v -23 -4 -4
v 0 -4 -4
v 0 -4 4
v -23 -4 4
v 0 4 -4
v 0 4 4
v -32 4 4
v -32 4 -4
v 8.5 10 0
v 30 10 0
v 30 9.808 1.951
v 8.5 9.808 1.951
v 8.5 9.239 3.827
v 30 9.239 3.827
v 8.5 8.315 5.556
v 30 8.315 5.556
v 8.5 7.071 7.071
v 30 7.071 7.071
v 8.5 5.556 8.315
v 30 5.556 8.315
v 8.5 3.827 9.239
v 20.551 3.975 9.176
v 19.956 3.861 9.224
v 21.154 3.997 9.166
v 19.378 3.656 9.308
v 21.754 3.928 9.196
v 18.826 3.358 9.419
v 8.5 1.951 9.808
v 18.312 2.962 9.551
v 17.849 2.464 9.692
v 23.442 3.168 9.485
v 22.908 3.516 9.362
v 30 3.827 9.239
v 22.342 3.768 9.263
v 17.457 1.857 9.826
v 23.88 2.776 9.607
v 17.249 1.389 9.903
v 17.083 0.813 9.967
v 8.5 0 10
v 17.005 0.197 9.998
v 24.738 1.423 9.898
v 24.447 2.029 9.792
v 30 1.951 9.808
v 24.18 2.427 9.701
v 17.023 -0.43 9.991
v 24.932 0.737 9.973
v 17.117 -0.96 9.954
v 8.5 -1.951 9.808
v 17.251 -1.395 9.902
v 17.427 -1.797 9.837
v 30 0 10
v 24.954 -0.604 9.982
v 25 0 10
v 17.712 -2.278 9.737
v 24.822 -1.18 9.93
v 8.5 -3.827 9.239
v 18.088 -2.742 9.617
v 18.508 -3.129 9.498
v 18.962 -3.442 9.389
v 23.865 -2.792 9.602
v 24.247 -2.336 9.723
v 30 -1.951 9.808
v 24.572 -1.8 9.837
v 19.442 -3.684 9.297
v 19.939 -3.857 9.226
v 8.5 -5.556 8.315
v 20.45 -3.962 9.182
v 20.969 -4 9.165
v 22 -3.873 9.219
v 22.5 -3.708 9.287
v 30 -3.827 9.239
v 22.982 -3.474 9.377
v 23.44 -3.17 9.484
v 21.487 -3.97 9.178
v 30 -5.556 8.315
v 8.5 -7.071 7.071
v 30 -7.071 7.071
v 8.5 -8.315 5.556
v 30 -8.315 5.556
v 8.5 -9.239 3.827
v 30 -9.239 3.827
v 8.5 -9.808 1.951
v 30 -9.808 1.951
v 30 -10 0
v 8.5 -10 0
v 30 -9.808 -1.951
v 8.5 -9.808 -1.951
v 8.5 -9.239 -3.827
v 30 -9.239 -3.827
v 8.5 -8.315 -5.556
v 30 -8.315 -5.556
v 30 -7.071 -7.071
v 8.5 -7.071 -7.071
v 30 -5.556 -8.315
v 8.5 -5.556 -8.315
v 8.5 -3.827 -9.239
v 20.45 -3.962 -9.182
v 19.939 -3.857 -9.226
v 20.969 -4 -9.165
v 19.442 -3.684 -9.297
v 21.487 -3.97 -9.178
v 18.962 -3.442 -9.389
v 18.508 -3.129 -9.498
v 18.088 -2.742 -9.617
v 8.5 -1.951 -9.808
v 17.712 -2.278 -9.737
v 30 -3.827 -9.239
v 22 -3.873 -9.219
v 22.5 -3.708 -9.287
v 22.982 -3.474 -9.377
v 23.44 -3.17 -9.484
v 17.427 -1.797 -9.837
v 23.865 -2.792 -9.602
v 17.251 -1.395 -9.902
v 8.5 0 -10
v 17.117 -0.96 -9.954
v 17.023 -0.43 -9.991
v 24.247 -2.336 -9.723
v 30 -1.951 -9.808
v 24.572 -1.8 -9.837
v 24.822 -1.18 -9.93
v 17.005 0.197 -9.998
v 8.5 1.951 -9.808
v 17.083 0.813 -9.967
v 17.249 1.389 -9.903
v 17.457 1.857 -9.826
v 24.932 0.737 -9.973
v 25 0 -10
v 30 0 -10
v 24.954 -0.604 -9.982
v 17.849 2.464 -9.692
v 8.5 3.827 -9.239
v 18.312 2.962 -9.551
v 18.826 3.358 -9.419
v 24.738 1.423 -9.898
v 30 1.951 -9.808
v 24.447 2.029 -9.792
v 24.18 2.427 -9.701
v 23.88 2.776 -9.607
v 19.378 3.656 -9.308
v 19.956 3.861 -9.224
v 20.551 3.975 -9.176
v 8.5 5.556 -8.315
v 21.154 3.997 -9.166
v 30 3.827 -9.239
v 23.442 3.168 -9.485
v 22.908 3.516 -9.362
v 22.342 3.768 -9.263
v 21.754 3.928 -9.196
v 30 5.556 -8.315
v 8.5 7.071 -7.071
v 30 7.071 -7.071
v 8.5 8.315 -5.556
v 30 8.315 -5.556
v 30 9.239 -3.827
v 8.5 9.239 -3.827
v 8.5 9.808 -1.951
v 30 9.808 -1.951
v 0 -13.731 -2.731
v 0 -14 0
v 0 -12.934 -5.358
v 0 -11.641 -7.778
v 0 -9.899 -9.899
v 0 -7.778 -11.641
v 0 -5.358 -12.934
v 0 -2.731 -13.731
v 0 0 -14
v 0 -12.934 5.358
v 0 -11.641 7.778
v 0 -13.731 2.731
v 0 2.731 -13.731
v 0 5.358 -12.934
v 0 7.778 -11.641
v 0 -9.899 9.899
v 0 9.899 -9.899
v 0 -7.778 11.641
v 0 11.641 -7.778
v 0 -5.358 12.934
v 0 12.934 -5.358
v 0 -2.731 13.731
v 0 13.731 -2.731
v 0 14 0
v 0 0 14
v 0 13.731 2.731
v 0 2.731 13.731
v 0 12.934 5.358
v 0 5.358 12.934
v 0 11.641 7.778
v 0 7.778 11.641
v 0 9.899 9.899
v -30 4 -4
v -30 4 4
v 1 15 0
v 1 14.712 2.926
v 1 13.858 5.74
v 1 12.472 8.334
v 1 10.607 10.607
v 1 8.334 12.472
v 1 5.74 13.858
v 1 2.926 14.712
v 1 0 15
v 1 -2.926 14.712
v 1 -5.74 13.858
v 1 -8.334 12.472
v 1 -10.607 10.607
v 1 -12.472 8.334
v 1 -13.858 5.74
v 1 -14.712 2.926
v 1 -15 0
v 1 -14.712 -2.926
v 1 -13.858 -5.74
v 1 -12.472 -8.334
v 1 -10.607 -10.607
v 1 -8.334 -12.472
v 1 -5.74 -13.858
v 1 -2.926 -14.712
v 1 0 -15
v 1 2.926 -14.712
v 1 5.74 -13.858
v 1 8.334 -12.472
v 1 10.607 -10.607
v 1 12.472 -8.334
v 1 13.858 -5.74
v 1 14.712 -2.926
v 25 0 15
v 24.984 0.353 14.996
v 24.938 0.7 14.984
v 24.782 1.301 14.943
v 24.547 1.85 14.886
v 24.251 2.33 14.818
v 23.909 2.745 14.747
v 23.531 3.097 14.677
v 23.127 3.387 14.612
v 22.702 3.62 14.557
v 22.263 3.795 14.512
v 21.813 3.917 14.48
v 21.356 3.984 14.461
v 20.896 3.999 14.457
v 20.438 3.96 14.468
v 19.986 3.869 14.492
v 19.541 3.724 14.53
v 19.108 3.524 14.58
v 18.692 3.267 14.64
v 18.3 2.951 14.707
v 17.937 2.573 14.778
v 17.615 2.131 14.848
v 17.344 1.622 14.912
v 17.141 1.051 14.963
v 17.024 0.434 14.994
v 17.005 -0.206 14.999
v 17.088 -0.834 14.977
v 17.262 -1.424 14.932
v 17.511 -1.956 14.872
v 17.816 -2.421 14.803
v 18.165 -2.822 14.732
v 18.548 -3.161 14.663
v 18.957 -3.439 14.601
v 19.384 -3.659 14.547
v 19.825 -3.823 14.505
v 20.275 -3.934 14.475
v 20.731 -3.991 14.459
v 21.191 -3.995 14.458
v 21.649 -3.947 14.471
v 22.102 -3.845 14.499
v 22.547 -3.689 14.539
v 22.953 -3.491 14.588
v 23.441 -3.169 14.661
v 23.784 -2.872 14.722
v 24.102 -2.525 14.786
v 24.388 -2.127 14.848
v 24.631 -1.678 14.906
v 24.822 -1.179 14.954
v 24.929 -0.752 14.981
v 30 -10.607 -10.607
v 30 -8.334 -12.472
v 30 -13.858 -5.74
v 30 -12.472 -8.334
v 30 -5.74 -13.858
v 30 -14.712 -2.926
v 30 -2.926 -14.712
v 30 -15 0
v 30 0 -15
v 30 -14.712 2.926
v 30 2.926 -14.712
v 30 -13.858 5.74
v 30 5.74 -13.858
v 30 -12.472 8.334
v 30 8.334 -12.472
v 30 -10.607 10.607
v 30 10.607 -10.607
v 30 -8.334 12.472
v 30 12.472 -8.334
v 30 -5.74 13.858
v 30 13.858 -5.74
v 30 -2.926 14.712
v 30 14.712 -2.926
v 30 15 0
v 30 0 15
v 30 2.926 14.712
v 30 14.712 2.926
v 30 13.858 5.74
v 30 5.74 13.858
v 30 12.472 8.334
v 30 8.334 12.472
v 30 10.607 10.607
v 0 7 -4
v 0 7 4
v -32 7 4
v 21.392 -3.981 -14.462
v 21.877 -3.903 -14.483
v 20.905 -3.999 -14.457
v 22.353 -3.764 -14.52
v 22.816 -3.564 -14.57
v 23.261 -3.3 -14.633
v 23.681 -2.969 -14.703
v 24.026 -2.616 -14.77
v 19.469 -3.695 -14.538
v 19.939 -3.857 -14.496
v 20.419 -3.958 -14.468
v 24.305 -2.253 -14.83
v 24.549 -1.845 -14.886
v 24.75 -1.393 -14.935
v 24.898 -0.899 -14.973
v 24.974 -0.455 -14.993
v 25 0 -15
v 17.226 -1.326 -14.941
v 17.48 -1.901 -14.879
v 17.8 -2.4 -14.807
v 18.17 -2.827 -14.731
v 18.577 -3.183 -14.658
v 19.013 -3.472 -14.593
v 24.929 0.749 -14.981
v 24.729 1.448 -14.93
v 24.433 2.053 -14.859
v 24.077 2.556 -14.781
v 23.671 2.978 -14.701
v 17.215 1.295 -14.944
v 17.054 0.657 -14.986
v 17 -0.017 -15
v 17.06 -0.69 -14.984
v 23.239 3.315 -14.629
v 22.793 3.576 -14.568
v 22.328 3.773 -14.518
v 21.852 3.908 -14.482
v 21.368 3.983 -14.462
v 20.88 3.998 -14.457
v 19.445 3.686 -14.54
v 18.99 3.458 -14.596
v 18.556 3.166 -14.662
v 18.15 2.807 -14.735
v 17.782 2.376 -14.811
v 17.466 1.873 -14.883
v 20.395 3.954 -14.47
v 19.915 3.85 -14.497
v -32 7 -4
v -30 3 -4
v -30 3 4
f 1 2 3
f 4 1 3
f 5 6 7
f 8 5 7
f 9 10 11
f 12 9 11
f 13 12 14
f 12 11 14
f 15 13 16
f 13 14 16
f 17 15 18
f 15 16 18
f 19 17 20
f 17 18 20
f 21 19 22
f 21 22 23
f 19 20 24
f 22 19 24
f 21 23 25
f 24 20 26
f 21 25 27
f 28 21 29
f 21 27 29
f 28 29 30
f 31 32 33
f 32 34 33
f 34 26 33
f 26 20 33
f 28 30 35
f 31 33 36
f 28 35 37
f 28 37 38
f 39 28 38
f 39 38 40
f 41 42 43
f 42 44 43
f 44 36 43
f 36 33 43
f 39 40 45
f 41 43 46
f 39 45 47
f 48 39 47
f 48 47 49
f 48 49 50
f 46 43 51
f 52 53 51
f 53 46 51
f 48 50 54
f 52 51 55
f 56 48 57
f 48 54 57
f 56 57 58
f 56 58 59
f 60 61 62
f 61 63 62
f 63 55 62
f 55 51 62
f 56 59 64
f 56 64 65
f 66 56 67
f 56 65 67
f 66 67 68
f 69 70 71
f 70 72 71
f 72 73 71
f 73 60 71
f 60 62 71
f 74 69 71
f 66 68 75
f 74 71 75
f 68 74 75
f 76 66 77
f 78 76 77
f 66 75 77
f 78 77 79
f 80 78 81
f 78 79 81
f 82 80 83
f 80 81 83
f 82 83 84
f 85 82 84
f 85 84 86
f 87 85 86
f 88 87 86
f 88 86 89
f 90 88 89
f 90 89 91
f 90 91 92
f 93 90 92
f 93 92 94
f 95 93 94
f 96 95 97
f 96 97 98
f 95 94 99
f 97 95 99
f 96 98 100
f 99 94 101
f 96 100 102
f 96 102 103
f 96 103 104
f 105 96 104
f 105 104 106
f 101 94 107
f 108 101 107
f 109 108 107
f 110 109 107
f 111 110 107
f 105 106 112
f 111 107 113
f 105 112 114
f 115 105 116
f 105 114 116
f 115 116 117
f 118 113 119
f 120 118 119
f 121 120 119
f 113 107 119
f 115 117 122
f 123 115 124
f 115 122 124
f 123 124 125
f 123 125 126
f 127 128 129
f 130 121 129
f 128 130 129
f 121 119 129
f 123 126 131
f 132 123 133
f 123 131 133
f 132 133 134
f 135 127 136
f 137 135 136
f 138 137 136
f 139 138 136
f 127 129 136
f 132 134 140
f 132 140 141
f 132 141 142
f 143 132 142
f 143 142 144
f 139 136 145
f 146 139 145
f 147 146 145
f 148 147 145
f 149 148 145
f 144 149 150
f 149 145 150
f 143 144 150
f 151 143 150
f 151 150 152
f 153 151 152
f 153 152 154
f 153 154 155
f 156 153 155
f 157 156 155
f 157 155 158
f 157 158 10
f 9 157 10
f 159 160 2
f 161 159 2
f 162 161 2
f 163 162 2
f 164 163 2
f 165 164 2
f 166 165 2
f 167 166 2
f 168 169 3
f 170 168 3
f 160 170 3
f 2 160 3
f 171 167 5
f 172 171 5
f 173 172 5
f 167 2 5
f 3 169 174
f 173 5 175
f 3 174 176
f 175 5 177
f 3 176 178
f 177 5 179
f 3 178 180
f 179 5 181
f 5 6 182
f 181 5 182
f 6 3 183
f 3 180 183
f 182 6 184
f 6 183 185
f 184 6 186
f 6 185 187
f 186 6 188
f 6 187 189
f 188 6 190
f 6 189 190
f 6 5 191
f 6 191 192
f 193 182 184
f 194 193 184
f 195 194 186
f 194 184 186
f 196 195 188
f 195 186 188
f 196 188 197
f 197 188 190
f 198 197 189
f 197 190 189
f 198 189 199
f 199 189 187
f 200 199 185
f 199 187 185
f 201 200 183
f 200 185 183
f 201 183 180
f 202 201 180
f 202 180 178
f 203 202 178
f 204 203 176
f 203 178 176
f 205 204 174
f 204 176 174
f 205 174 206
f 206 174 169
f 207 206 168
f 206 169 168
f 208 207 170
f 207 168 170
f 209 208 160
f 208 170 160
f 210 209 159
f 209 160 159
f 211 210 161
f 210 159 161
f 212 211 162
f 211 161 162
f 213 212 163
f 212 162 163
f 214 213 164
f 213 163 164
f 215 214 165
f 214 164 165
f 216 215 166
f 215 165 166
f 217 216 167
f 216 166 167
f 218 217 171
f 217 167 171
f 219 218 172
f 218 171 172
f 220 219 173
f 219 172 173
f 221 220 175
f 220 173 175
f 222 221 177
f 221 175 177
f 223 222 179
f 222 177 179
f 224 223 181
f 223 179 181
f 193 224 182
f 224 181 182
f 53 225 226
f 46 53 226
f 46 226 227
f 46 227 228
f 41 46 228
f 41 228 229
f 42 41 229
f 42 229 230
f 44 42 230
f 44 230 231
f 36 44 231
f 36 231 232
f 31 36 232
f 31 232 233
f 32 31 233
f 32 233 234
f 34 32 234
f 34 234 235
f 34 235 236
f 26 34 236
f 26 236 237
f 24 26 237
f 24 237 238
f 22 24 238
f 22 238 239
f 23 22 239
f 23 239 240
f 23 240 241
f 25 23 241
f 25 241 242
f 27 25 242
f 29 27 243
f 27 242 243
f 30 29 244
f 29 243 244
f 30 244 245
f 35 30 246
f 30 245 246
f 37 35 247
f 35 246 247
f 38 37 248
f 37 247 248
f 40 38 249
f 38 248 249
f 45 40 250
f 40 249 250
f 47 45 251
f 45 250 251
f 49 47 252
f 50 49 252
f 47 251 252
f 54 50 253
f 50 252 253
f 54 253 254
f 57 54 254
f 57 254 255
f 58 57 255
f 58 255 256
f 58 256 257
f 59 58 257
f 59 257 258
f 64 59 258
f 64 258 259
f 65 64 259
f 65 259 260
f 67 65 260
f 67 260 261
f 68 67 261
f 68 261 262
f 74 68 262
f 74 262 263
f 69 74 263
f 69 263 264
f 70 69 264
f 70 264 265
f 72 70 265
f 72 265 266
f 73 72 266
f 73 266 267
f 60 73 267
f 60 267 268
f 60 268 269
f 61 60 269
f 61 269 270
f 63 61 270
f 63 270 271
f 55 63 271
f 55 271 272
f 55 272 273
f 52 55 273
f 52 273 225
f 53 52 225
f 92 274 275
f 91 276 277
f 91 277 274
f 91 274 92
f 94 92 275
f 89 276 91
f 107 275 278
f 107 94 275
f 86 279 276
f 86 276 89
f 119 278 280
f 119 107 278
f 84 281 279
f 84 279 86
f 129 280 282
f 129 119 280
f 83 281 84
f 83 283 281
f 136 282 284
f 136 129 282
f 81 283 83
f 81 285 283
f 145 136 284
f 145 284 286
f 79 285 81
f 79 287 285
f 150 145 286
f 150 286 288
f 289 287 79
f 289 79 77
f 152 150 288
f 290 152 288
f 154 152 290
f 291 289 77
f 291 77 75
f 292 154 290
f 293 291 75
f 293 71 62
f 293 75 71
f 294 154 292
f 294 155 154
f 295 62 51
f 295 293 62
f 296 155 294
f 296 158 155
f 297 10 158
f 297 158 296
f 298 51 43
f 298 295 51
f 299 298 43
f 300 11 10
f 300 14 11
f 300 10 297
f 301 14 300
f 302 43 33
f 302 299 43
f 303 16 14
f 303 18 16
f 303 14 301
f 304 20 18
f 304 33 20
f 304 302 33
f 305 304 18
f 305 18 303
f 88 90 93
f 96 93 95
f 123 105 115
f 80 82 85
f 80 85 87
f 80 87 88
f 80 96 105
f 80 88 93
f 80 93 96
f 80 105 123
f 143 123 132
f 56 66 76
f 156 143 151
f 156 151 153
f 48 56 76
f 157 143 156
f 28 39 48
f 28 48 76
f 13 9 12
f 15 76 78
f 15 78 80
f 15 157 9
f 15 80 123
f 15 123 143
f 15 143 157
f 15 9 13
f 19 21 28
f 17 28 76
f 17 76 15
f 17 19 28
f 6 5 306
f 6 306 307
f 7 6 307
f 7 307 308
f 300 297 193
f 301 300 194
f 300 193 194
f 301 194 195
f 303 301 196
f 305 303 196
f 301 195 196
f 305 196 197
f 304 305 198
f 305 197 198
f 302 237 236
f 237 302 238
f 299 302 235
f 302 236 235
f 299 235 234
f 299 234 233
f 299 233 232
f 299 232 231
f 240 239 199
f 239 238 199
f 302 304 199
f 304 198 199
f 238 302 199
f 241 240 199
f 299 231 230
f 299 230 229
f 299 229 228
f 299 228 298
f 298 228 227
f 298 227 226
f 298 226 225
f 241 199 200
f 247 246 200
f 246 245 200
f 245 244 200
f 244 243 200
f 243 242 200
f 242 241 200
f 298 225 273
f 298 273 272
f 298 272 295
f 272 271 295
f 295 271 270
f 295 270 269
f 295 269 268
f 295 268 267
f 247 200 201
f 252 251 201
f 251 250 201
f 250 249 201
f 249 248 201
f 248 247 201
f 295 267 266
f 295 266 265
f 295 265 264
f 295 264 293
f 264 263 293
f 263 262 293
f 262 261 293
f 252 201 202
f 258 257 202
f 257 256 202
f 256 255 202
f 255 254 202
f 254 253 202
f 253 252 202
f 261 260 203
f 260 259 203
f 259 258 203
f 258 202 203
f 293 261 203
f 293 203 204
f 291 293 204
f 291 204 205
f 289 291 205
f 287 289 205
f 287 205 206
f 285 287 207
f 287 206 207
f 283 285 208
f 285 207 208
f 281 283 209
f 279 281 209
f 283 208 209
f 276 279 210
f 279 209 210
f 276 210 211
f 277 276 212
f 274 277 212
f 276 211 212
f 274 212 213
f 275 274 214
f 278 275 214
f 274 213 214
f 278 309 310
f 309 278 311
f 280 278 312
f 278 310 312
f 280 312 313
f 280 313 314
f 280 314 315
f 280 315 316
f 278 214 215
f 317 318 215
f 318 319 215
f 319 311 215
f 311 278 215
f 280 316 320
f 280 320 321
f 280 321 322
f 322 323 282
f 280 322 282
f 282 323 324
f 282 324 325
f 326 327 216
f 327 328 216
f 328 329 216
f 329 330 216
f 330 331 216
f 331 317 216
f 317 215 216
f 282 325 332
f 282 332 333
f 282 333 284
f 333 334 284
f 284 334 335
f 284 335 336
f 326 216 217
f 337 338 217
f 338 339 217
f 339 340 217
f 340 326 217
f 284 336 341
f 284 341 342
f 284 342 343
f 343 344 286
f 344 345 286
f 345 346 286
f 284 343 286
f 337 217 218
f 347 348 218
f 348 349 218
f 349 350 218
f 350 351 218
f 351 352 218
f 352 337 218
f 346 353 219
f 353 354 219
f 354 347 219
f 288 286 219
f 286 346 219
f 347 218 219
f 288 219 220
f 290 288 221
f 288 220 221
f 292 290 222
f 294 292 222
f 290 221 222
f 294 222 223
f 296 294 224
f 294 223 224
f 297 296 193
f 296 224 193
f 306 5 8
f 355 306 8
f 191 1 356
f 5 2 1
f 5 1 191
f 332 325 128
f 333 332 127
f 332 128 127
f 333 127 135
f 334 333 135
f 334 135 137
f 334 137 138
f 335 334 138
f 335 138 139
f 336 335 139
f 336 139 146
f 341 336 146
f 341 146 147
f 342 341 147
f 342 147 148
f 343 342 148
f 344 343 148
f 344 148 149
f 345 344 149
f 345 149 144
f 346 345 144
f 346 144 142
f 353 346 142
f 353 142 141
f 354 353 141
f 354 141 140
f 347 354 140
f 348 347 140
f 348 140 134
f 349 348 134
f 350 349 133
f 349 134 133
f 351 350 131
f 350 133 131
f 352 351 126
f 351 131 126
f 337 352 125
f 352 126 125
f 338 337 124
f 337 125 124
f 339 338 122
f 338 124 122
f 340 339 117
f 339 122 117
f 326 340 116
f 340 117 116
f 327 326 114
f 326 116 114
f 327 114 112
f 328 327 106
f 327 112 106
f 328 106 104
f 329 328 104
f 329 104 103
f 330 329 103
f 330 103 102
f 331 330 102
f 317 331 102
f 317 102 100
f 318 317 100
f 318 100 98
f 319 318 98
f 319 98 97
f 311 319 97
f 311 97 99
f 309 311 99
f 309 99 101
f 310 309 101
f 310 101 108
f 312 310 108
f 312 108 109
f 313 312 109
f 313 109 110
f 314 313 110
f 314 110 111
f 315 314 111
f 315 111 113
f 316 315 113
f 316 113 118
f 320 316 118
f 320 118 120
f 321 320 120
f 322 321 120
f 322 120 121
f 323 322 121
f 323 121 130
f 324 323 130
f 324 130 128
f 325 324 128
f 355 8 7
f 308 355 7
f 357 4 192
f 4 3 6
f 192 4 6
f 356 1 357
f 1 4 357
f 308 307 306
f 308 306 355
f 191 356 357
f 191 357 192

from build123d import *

# Parameters (mm, degrees)
F0_R           = 15
F1_DEPTH       = 30
F2_R           = 10
F3_DEPTH       = 21.5
F5_R           = 4
F6_DEPTH       = 30.001
F7_W           = 8
F7_H           = 8
F8_DEPTH       = 30
F10_DEPTH      = 4
F10_DEPTH_BACK = 4
F11_SIZE       = 1
F12_W          = 32
F12_H          = 8
F13_DEPTH      = 3


with BuildPart() as f1:
    # F0 (on Right) → F1 (new body)
    with BuildSketch(Plane.YZ):
        Circle(F0_R)
    extrude(amount=F1_DEPTH)

    # F2 (on face) → F3 (cut)
    with BuildSketch(Plane.YZ.offset(30)):
        Circle(F2_R)
    extrude(amount=-F3_DEPTH, mode=Mode.SUBTRACT)

    # F5 (on offset) → F6 (cut, through all)
    with BuildSketch(Plane.XY.offset(15)):
        with Locations((21, 0)):
            Circle(F5_R)
    extrude(amount=-F6_DEPTH, mode=Mode.SUBTRACT)

    # F7 (on Right) → F8 (join)
    with BuildSketch(Plane.YZ):
        Rectangle(F7_W, F7_H)
    extrude(amount=-F8_DEPTH)

    # F9 (on Top) → F10 (cut, two sides)
    with BuildSketch(Plane.XY) as f10_sk:
        Polygon((-23, -4), (-30, 3), (-30, -4), align=None)
    extrude(amount=-F10_DEPTH, mode=Mode.SUBTRACT)
    extrude(f10_sk.sketch, amount=F10_DEPTH_BACK, mode=Mode.SUBTRACT)

    # F11
    f11_edges = [f1.edges().sort_by_distance(p)[0] for p in [
        (0, -15, 0),
    ]]
    chamfer(f11_edges, length=F11_SIZE)


with BuildPart() as f13:
    # F12 (on face) → F13 (new body)
    with BuildSketch(Plane(origin=(0, 4, 0), x_dir=(-1, 0, 0), z_dir=(0, 1, 0))):
        with Locations((16, 0)):
            Rectangle(F12_W, F12_H)
    extrude(amount=F13_DEPTH)


solid = Compound([f1.part, f13.part])
